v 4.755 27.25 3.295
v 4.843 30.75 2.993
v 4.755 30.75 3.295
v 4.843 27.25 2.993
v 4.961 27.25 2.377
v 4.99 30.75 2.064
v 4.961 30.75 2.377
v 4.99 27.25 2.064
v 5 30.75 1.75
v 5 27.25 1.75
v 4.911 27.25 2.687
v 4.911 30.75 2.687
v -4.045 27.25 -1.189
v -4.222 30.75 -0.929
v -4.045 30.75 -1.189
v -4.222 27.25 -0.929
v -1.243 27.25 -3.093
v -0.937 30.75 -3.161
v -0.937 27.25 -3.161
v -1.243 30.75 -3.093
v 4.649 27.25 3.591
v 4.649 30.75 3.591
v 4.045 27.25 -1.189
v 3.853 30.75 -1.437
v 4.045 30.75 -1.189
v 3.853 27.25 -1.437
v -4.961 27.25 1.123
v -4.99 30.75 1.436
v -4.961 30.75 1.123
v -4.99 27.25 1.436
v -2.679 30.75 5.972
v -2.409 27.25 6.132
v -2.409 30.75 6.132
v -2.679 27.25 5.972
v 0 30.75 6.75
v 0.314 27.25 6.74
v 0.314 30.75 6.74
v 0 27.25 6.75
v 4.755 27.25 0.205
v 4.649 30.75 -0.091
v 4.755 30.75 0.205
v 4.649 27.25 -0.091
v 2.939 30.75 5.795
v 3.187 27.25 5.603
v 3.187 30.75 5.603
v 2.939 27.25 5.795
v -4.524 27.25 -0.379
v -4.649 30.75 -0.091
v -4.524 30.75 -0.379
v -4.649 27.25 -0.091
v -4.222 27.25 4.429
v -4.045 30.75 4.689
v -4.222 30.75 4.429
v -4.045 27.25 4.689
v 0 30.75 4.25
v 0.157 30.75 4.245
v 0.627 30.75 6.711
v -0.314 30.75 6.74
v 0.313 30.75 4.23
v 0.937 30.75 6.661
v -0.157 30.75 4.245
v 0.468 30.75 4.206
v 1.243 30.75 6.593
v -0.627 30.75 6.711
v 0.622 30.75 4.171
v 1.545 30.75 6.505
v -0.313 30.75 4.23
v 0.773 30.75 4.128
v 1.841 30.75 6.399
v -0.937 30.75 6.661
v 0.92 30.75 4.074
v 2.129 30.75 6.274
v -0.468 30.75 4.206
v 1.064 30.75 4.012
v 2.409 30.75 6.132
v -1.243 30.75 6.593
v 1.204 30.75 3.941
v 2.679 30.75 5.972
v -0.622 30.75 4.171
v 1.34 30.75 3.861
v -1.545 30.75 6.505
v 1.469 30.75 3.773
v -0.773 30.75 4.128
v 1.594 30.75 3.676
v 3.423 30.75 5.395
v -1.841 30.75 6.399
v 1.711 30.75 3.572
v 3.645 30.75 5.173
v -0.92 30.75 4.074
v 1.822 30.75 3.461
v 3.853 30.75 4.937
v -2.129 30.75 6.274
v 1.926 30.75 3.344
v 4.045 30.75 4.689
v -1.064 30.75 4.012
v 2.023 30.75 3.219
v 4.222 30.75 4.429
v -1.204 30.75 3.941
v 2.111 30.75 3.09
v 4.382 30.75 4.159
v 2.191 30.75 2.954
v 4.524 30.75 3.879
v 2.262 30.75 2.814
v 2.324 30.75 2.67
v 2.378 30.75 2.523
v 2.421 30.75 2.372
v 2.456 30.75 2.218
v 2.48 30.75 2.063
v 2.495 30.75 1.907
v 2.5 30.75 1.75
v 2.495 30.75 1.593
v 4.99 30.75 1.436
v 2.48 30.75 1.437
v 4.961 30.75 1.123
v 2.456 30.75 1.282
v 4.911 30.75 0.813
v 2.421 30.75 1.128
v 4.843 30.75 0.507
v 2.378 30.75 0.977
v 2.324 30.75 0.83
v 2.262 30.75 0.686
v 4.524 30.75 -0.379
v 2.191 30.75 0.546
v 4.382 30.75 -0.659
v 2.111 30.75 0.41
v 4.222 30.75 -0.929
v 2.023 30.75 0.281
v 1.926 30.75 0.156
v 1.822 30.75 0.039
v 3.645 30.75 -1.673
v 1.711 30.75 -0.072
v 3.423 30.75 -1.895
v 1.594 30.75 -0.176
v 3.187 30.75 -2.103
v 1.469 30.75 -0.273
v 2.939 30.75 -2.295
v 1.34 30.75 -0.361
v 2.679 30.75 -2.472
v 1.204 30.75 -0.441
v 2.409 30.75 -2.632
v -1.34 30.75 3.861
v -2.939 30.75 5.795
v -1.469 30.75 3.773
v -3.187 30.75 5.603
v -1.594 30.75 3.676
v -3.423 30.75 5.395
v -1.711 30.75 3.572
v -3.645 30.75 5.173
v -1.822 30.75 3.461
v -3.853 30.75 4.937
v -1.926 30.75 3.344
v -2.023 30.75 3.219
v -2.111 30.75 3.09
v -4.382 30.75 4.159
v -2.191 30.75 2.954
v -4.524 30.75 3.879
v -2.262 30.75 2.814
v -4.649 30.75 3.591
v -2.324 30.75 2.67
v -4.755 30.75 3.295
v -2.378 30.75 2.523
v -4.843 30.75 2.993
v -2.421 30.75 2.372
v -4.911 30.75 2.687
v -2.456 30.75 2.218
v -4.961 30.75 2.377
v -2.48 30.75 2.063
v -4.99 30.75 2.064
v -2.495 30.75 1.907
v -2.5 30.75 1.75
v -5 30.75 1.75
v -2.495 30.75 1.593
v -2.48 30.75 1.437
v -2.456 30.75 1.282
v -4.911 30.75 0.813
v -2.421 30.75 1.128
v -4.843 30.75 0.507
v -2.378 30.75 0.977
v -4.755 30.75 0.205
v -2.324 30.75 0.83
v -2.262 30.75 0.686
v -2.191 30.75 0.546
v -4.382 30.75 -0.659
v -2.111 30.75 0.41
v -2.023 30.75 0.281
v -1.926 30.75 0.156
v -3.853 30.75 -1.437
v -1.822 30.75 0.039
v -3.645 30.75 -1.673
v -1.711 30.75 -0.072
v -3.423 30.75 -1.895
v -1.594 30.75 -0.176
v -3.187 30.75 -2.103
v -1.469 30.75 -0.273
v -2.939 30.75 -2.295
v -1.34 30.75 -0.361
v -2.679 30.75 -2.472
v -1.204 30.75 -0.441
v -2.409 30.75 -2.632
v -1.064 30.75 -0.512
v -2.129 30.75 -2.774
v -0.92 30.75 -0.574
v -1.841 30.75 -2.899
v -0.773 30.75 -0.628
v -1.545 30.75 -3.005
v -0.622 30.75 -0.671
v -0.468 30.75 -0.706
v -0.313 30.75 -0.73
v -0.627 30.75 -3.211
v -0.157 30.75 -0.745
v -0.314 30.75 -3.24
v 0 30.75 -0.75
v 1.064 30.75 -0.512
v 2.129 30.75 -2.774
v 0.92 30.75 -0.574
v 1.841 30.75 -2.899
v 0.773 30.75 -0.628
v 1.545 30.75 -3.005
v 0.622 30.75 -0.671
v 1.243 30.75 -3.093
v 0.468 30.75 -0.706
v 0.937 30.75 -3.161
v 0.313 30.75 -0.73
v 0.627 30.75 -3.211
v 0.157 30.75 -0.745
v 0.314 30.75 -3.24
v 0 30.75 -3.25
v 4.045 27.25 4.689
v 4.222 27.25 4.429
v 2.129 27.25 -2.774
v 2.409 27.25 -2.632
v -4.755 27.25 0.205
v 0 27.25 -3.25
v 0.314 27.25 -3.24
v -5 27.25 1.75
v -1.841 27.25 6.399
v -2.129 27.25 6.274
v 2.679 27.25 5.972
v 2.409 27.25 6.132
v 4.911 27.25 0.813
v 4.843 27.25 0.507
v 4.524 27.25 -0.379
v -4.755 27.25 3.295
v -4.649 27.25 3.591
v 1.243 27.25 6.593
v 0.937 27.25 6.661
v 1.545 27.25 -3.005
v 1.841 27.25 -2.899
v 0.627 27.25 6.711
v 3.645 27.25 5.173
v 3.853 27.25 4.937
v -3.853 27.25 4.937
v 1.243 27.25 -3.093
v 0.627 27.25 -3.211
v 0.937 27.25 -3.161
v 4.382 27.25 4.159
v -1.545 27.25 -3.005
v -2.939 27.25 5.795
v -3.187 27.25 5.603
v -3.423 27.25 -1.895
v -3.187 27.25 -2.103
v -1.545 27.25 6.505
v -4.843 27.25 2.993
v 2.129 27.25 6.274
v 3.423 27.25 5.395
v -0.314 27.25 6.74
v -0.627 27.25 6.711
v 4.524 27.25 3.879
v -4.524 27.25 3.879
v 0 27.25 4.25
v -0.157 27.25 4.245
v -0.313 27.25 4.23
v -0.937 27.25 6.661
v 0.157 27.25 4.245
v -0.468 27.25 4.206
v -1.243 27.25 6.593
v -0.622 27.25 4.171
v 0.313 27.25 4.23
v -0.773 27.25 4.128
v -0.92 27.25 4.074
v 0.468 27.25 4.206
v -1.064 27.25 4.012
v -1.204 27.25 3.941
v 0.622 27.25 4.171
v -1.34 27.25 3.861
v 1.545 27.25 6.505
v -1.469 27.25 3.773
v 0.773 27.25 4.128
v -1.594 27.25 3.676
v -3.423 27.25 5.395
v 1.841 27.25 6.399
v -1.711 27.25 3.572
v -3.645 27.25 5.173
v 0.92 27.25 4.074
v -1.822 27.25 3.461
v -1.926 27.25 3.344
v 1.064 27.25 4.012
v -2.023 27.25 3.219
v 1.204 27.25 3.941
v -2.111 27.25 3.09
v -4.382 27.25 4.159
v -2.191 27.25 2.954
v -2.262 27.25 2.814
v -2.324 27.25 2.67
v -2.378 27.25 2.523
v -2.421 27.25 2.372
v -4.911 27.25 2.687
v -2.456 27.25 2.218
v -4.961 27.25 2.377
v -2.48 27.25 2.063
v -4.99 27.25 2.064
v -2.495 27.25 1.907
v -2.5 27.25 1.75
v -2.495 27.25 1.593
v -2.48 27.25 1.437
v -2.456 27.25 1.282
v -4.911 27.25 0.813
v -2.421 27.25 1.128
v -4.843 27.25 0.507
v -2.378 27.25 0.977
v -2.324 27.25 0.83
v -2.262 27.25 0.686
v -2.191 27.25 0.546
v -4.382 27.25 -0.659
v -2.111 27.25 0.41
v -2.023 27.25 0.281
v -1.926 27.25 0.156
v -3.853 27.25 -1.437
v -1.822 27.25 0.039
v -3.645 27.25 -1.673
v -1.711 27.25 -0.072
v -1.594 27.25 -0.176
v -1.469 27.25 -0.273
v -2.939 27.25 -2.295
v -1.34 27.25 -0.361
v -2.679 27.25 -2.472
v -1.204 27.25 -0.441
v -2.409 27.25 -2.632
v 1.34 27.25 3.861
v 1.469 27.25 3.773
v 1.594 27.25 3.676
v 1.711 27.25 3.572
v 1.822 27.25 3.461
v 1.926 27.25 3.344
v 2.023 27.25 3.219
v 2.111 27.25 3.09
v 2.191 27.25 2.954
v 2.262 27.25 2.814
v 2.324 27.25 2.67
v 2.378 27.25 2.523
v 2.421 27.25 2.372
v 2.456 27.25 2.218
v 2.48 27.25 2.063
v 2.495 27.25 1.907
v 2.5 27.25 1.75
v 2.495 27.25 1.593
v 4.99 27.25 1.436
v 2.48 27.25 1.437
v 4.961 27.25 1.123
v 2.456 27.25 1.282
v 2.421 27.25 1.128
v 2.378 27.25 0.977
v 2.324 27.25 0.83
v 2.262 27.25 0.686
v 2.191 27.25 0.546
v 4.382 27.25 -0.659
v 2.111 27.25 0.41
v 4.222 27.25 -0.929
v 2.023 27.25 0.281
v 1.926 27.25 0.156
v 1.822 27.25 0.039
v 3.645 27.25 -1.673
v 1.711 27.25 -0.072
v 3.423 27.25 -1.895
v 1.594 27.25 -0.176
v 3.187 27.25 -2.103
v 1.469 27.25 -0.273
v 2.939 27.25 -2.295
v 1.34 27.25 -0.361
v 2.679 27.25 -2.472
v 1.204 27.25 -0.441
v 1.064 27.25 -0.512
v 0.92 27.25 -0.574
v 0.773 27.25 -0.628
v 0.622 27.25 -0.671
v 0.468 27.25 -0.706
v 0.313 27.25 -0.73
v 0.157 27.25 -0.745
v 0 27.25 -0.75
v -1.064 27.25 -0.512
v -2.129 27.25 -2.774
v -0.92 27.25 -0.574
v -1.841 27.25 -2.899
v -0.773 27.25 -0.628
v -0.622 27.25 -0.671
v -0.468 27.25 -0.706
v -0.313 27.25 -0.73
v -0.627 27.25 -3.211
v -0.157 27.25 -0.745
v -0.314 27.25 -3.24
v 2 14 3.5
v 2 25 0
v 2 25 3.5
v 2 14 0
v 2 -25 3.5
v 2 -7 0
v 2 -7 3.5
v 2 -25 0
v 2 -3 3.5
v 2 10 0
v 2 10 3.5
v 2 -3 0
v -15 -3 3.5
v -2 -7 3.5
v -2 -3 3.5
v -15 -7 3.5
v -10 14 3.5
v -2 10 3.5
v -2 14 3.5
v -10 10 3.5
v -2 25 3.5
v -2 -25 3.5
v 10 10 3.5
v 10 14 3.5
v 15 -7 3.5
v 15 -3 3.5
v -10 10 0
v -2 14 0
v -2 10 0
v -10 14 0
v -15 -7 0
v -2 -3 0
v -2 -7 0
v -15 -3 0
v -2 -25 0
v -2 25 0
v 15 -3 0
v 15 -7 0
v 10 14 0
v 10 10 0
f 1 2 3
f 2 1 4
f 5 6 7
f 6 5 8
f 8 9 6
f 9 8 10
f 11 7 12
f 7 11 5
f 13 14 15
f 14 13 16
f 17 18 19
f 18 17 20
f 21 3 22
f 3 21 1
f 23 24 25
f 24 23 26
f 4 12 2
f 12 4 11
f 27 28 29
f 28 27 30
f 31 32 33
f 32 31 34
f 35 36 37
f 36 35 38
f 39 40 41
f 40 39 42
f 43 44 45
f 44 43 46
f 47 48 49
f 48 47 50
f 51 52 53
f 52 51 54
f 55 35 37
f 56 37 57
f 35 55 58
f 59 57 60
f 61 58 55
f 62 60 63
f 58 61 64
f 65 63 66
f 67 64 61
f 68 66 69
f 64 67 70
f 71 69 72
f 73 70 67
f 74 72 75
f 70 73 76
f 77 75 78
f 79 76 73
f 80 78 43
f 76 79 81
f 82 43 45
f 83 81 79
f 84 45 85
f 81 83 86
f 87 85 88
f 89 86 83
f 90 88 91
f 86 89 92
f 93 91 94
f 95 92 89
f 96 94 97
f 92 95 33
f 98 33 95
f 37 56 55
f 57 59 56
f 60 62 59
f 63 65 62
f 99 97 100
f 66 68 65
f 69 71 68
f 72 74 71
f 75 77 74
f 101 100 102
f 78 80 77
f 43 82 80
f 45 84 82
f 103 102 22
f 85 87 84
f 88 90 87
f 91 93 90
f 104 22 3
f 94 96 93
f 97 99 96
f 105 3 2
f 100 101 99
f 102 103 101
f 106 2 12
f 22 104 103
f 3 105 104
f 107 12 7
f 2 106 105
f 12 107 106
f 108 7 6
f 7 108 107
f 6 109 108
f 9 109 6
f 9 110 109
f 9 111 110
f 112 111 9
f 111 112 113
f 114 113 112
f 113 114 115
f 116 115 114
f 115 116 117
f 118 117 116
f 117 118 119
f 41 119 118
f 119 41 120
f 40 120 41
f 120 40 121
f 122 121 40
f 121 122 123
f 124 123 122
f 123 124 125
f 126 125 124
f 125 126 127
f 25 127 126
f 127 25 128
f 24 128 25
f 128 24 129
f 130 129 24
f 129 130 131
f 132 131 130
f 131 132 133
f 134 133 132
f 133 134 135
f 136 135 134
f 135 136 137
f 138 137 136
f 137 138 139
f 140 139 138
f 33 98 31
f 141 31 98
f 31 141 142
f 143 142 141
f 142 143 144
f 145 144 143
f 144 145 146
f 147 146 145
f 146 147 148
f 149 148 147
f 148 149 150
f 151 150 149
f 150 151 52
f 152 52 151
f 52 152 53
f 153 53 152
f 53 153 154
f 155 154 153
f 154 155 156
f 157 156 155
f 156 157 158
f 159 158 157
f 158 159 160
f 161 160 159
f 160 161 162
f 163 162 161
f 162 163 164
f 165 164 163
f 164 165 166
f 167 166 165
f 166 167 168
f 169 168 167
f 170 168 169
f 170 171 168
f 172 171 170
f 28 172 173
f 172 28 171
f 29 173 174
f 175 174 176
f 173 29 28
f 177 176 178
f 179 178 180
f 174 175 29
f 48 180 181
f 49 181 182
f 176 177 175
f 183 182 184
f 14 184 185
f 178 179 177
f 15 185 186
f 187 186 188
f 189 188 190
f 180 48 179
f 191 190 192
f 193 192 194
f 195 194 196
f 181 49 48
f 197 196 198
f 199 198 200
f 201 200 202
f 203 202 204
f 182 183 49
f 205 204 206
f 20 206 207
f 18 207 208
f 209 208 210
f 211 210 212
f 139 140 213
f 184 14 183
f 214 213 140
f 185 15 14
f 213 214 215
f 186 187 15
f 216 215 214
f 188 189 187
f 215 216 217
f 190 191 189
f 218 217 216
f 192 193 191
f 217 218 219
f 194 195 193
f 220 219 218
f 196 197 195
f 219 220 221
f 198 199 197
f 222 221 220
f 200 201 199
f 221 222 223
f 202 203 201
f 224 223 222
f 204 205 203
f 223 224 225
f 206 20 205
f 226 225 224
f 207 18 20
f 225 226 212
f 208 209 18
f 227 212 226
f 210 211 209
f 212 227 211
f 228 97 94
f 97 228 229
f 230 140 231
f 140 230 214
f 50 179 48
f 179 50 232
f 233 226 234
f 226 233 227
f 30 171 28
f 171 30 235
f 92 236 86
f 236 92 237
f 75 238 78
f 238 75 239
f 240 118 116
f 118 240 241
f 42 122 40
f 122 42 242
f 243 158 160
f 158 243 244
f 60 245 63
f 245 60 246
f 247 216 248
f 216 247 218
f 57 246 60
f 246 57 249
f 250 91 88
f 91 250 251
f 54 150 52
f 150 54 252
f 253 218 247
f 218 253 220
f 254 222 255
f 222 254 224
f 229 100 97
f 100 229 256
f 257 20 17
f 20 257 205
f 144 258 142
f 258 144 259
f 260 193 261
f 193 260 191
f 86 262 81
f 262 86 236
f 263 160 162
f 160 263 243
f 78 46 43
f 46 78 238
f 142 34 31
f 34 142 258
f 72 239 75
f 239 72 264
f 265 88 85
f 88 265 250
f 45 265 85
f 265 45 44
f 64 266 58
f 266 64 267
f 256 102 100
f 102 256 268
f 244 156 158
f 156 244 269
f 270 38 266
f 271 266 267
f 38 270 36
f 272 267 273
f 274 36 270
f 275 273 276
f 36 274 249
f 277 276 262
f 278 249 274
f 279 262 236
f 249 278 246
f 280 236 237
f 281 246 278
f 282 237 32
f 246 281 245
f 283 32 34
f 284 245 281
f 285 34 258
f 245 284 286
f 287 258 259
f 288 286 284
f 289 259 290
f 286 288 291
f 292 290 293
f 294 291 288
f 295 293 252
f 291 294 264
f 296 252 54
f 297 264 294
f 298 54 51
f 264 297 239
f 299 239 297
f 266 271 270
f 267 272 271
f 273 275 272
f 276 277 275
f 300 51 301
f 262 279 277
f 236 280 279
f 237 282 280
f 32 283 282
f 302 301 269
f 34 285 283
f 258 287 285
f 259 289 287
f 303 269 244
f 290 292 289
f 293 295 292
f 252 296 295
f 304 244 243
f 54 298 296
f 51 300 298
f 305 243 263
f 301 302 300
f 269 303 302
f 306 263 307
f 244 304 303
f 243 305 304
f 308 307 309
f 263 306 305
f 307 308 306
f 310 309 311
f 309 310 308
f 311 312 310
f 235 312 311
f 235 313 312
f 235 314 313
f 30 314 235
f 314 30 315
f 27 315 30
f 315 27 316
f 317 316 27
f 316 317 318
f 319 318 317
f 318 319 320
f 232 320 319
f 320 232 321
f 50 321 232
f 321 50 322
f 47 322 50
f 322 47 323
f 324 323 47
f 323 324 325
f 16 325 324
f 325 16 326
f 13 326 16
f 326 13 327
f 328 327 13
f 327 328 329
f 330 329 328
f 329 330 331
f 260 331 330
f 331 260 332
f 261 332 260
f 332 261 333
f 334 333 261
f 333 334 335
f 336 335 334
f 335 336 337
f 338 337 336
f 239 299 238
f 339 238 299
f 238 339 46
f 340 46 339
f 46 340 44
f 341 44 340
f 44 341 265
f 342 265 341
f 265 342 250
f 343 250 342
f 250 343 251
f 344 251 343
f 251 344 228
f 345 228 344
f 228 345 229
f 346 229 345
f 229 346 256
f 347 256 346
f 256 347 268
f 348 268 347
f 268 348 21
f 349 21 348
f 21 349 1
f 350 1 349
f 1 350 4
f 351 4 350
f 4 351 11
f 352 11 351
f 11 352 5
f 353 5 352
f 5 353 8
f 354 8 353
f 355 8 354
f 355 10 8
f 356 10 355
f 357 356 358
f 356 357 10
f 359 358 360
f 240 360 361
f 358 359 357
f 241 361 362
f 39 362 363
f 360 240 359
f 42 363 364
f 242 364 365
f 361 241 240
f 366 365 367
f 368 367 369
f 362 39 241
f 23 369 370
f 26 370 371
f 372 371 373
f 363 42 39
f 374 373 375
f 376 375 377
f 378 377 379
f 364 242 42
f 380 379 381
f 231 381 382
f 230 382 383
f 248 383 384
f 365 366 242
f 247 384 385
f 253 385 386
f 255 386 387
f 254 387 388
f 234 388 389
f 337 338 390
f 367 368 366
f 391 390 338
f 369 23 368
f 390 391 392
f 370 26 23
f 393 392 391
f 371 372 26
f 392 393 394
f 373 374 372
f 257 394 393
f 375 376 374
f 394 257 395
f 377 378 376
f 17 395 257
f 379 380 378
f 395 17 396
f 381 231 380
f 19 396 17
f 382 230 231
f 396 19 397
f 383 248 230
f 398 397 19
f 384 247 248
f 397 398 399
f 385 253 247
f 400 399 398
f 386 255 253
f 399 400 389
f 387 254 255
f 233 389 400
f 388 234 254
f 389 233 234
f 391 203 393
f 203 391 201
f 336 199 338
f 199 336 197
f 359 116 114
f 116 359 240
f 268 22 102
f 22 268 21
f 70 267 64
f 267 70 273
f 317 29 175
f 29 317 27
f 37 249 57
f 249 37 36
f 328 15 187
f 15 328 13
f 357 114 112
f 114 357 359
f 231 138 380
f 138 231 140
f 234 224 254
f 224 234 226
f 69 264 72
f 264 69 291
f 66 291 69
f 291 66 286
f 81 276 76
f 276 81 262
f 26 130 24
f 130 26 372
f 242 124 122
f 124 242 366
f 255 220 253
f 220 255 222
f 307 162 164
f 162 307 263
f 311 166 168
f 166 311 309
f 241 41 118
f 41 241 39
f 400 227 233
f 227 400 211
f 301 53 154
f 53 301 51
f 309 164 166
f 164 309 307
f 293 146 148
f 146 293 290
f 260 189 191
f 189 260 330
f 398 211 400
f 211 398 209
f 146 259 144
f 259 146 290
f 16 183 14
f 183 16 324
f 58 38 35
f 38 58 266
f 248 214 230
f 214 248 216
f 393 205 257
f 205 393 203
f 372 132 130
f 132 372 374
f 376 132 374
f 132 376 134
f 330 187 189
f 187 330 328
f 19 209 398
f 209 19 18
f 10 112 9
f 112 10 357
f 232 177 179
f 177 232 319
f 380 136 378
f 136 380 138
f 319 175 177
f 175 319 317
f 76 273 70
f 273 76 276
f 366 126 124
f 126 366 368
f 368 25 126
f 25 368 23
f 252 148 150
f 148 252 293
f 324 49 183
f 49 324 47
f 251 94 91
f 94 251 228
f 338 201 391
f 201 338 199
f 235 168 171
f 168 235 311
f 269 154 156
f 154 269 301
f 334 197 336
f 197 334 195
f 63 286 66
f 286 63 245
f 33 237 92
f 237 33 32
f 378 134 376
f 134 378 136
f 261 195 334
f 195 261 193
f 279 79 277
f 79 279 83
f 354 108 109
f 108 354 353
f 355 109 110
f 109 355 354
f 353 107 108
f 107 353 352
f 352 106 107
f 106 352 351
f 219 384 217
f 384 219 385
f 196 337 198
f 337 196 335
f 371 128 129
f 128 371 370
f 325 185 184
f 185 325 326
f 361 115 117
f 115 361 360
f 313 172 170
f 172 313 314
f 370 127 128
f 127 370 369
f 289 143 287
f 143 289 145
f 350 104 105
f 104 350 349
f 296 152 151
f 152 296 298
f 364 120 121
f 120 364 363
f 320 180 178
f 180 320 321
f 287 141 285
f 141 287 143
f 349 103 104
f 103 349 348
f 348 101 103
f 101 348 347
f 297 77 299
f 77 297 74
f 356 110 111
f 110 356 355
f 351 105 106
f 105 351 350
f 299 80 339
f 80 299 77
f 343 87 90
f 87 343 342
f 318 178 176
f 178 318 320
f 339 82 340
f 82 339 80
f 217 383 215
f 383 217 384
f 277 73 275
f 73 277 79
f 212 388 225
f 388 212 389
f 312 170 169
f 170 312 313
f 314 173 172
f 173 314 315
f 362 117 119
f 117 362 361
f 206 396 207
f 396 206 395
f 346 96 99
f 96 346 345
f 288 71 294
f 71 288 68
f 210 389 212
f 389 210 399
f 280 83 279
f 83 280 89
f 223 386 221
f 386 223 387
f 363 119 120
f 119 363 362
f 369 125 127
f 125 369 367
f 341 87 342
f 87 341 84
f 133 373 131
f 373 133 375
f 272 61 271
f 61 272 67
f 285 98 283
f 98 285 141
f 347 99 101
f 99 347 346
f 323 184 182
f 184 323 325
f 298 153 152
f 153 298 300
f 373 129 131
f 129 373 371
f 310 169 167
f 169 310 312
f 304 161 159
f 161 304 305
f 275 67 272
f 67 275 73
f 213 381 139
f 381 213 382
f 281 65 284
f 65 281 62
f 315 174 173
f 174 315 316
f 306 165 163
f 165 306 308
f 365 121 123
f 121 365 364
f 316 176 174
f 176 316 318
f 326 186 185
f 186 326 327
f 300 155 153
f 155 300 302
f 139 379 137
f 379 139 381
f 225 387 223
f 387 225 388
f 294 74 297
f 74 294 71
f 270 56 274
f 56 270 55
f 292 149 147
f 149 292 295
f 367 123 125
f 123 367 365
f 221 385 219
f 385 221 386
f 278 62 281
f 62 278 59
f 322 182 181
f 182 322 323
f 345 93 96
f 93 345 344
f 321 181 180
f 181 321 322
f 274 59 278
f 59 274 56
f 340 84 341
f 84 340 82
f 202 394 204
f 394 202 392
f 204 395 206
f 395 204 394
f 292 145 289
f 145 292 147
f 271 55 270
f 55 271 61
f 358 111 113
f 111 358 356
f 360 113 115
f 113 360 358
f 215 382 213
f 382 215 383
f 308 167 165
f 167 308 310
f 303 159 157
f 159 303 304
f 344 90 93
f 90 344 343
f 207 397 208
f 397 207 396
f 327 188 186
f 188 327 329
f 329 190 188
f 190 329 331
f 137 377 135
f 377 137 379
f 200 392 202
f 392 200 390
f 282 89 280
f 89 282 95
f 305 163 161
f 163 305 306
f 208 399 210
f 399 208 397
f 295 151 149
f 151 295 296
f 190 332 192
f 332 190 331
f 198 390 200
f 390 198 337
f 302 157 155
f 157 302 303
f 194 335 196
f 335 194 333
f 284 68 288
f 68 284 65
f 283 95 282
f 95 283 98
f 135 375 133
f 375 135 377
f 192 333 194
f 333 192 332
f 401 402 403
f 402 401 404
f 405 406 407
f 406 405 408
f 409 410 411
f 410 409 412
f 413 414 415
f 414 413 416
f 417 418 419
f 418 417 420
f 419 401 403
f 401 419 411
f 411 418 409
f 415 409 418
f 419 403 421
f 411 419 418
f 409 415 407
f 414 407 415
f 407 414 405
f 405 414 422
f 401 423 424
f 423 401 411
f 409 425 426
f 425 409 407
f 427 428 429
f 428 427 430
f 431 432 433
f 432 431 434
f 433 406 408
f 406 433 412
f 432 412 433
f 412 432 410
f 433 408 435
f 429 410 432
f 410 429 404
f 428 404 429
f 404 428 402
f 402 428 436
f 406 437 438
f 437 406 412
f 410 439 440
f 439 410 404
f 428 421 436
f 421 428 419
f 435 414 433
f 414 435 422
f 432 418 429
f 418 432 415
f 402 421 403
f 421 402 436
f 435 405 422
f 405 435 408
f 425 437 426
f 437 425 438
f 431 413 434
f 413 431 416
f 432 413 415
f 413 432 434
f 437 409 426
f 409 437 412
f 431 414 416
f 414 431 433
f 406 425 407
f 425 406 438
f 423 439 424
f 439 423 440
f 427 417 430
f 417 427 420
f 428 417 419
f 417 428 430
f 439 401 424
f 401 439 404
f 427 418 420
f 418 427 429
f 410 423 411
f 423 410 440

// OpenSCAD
// ============================================================================
// VITA TESORI BY VHALSUEO - MASTER JEWELRY PORTFOLIO
// FILE: VT_Mens_Patriarchal_Cross_v1.scad
// MATERIAL SPEC: 100% Solid 24K Gold Casting (Zero Lab Synthetics)
// ============================================================================

$fn = 100; // Flawless high-density rendering curves for casting

// Adjustable Master Dimensions (mm)
cross_height = 50.0;     // Total vertical axis height
main_width = 30.0;       // Width of primary lower crossbar
upper_width = 20.0;      // Width of smaller upper crossbar
stem_thickness = 4.0;    // Thickness of the square cross beams
depth = 3.5;             // Total solid gold plate depth

module patriarchal_cross() {
    union() {
        // 1. Central Vertical Stem
        translate([0, 0, depth/2])
        cube([stem_thickness, cross_height, depth], center=true);
        
        // 2. Primary Lower Crossbar
        translate([0, -5, depth/2])
        cube([main_width, stem_thickness, depth], center=true);
        
        // 3. Smaller Upper Crossbar
        translate([0, 12, depth/2])
        cube([upper_width, stem_thickness, depth], center=true);
        
        // 4. Heavy Duty Suspension Bail (Top Loop for Chain Pass-Through)
        translate([0, cross_height/2 + 4, depth/2])
        rotate([90, 0, 0])
        difference() {
            cylinder(h=depth, r=5, center=true);
            cylinder(h=depth+2, r=2.5, center=true);
        }
    }
}

// Render the 3D Solid Gold Patriarchal Cross
patriarchal_cross();
